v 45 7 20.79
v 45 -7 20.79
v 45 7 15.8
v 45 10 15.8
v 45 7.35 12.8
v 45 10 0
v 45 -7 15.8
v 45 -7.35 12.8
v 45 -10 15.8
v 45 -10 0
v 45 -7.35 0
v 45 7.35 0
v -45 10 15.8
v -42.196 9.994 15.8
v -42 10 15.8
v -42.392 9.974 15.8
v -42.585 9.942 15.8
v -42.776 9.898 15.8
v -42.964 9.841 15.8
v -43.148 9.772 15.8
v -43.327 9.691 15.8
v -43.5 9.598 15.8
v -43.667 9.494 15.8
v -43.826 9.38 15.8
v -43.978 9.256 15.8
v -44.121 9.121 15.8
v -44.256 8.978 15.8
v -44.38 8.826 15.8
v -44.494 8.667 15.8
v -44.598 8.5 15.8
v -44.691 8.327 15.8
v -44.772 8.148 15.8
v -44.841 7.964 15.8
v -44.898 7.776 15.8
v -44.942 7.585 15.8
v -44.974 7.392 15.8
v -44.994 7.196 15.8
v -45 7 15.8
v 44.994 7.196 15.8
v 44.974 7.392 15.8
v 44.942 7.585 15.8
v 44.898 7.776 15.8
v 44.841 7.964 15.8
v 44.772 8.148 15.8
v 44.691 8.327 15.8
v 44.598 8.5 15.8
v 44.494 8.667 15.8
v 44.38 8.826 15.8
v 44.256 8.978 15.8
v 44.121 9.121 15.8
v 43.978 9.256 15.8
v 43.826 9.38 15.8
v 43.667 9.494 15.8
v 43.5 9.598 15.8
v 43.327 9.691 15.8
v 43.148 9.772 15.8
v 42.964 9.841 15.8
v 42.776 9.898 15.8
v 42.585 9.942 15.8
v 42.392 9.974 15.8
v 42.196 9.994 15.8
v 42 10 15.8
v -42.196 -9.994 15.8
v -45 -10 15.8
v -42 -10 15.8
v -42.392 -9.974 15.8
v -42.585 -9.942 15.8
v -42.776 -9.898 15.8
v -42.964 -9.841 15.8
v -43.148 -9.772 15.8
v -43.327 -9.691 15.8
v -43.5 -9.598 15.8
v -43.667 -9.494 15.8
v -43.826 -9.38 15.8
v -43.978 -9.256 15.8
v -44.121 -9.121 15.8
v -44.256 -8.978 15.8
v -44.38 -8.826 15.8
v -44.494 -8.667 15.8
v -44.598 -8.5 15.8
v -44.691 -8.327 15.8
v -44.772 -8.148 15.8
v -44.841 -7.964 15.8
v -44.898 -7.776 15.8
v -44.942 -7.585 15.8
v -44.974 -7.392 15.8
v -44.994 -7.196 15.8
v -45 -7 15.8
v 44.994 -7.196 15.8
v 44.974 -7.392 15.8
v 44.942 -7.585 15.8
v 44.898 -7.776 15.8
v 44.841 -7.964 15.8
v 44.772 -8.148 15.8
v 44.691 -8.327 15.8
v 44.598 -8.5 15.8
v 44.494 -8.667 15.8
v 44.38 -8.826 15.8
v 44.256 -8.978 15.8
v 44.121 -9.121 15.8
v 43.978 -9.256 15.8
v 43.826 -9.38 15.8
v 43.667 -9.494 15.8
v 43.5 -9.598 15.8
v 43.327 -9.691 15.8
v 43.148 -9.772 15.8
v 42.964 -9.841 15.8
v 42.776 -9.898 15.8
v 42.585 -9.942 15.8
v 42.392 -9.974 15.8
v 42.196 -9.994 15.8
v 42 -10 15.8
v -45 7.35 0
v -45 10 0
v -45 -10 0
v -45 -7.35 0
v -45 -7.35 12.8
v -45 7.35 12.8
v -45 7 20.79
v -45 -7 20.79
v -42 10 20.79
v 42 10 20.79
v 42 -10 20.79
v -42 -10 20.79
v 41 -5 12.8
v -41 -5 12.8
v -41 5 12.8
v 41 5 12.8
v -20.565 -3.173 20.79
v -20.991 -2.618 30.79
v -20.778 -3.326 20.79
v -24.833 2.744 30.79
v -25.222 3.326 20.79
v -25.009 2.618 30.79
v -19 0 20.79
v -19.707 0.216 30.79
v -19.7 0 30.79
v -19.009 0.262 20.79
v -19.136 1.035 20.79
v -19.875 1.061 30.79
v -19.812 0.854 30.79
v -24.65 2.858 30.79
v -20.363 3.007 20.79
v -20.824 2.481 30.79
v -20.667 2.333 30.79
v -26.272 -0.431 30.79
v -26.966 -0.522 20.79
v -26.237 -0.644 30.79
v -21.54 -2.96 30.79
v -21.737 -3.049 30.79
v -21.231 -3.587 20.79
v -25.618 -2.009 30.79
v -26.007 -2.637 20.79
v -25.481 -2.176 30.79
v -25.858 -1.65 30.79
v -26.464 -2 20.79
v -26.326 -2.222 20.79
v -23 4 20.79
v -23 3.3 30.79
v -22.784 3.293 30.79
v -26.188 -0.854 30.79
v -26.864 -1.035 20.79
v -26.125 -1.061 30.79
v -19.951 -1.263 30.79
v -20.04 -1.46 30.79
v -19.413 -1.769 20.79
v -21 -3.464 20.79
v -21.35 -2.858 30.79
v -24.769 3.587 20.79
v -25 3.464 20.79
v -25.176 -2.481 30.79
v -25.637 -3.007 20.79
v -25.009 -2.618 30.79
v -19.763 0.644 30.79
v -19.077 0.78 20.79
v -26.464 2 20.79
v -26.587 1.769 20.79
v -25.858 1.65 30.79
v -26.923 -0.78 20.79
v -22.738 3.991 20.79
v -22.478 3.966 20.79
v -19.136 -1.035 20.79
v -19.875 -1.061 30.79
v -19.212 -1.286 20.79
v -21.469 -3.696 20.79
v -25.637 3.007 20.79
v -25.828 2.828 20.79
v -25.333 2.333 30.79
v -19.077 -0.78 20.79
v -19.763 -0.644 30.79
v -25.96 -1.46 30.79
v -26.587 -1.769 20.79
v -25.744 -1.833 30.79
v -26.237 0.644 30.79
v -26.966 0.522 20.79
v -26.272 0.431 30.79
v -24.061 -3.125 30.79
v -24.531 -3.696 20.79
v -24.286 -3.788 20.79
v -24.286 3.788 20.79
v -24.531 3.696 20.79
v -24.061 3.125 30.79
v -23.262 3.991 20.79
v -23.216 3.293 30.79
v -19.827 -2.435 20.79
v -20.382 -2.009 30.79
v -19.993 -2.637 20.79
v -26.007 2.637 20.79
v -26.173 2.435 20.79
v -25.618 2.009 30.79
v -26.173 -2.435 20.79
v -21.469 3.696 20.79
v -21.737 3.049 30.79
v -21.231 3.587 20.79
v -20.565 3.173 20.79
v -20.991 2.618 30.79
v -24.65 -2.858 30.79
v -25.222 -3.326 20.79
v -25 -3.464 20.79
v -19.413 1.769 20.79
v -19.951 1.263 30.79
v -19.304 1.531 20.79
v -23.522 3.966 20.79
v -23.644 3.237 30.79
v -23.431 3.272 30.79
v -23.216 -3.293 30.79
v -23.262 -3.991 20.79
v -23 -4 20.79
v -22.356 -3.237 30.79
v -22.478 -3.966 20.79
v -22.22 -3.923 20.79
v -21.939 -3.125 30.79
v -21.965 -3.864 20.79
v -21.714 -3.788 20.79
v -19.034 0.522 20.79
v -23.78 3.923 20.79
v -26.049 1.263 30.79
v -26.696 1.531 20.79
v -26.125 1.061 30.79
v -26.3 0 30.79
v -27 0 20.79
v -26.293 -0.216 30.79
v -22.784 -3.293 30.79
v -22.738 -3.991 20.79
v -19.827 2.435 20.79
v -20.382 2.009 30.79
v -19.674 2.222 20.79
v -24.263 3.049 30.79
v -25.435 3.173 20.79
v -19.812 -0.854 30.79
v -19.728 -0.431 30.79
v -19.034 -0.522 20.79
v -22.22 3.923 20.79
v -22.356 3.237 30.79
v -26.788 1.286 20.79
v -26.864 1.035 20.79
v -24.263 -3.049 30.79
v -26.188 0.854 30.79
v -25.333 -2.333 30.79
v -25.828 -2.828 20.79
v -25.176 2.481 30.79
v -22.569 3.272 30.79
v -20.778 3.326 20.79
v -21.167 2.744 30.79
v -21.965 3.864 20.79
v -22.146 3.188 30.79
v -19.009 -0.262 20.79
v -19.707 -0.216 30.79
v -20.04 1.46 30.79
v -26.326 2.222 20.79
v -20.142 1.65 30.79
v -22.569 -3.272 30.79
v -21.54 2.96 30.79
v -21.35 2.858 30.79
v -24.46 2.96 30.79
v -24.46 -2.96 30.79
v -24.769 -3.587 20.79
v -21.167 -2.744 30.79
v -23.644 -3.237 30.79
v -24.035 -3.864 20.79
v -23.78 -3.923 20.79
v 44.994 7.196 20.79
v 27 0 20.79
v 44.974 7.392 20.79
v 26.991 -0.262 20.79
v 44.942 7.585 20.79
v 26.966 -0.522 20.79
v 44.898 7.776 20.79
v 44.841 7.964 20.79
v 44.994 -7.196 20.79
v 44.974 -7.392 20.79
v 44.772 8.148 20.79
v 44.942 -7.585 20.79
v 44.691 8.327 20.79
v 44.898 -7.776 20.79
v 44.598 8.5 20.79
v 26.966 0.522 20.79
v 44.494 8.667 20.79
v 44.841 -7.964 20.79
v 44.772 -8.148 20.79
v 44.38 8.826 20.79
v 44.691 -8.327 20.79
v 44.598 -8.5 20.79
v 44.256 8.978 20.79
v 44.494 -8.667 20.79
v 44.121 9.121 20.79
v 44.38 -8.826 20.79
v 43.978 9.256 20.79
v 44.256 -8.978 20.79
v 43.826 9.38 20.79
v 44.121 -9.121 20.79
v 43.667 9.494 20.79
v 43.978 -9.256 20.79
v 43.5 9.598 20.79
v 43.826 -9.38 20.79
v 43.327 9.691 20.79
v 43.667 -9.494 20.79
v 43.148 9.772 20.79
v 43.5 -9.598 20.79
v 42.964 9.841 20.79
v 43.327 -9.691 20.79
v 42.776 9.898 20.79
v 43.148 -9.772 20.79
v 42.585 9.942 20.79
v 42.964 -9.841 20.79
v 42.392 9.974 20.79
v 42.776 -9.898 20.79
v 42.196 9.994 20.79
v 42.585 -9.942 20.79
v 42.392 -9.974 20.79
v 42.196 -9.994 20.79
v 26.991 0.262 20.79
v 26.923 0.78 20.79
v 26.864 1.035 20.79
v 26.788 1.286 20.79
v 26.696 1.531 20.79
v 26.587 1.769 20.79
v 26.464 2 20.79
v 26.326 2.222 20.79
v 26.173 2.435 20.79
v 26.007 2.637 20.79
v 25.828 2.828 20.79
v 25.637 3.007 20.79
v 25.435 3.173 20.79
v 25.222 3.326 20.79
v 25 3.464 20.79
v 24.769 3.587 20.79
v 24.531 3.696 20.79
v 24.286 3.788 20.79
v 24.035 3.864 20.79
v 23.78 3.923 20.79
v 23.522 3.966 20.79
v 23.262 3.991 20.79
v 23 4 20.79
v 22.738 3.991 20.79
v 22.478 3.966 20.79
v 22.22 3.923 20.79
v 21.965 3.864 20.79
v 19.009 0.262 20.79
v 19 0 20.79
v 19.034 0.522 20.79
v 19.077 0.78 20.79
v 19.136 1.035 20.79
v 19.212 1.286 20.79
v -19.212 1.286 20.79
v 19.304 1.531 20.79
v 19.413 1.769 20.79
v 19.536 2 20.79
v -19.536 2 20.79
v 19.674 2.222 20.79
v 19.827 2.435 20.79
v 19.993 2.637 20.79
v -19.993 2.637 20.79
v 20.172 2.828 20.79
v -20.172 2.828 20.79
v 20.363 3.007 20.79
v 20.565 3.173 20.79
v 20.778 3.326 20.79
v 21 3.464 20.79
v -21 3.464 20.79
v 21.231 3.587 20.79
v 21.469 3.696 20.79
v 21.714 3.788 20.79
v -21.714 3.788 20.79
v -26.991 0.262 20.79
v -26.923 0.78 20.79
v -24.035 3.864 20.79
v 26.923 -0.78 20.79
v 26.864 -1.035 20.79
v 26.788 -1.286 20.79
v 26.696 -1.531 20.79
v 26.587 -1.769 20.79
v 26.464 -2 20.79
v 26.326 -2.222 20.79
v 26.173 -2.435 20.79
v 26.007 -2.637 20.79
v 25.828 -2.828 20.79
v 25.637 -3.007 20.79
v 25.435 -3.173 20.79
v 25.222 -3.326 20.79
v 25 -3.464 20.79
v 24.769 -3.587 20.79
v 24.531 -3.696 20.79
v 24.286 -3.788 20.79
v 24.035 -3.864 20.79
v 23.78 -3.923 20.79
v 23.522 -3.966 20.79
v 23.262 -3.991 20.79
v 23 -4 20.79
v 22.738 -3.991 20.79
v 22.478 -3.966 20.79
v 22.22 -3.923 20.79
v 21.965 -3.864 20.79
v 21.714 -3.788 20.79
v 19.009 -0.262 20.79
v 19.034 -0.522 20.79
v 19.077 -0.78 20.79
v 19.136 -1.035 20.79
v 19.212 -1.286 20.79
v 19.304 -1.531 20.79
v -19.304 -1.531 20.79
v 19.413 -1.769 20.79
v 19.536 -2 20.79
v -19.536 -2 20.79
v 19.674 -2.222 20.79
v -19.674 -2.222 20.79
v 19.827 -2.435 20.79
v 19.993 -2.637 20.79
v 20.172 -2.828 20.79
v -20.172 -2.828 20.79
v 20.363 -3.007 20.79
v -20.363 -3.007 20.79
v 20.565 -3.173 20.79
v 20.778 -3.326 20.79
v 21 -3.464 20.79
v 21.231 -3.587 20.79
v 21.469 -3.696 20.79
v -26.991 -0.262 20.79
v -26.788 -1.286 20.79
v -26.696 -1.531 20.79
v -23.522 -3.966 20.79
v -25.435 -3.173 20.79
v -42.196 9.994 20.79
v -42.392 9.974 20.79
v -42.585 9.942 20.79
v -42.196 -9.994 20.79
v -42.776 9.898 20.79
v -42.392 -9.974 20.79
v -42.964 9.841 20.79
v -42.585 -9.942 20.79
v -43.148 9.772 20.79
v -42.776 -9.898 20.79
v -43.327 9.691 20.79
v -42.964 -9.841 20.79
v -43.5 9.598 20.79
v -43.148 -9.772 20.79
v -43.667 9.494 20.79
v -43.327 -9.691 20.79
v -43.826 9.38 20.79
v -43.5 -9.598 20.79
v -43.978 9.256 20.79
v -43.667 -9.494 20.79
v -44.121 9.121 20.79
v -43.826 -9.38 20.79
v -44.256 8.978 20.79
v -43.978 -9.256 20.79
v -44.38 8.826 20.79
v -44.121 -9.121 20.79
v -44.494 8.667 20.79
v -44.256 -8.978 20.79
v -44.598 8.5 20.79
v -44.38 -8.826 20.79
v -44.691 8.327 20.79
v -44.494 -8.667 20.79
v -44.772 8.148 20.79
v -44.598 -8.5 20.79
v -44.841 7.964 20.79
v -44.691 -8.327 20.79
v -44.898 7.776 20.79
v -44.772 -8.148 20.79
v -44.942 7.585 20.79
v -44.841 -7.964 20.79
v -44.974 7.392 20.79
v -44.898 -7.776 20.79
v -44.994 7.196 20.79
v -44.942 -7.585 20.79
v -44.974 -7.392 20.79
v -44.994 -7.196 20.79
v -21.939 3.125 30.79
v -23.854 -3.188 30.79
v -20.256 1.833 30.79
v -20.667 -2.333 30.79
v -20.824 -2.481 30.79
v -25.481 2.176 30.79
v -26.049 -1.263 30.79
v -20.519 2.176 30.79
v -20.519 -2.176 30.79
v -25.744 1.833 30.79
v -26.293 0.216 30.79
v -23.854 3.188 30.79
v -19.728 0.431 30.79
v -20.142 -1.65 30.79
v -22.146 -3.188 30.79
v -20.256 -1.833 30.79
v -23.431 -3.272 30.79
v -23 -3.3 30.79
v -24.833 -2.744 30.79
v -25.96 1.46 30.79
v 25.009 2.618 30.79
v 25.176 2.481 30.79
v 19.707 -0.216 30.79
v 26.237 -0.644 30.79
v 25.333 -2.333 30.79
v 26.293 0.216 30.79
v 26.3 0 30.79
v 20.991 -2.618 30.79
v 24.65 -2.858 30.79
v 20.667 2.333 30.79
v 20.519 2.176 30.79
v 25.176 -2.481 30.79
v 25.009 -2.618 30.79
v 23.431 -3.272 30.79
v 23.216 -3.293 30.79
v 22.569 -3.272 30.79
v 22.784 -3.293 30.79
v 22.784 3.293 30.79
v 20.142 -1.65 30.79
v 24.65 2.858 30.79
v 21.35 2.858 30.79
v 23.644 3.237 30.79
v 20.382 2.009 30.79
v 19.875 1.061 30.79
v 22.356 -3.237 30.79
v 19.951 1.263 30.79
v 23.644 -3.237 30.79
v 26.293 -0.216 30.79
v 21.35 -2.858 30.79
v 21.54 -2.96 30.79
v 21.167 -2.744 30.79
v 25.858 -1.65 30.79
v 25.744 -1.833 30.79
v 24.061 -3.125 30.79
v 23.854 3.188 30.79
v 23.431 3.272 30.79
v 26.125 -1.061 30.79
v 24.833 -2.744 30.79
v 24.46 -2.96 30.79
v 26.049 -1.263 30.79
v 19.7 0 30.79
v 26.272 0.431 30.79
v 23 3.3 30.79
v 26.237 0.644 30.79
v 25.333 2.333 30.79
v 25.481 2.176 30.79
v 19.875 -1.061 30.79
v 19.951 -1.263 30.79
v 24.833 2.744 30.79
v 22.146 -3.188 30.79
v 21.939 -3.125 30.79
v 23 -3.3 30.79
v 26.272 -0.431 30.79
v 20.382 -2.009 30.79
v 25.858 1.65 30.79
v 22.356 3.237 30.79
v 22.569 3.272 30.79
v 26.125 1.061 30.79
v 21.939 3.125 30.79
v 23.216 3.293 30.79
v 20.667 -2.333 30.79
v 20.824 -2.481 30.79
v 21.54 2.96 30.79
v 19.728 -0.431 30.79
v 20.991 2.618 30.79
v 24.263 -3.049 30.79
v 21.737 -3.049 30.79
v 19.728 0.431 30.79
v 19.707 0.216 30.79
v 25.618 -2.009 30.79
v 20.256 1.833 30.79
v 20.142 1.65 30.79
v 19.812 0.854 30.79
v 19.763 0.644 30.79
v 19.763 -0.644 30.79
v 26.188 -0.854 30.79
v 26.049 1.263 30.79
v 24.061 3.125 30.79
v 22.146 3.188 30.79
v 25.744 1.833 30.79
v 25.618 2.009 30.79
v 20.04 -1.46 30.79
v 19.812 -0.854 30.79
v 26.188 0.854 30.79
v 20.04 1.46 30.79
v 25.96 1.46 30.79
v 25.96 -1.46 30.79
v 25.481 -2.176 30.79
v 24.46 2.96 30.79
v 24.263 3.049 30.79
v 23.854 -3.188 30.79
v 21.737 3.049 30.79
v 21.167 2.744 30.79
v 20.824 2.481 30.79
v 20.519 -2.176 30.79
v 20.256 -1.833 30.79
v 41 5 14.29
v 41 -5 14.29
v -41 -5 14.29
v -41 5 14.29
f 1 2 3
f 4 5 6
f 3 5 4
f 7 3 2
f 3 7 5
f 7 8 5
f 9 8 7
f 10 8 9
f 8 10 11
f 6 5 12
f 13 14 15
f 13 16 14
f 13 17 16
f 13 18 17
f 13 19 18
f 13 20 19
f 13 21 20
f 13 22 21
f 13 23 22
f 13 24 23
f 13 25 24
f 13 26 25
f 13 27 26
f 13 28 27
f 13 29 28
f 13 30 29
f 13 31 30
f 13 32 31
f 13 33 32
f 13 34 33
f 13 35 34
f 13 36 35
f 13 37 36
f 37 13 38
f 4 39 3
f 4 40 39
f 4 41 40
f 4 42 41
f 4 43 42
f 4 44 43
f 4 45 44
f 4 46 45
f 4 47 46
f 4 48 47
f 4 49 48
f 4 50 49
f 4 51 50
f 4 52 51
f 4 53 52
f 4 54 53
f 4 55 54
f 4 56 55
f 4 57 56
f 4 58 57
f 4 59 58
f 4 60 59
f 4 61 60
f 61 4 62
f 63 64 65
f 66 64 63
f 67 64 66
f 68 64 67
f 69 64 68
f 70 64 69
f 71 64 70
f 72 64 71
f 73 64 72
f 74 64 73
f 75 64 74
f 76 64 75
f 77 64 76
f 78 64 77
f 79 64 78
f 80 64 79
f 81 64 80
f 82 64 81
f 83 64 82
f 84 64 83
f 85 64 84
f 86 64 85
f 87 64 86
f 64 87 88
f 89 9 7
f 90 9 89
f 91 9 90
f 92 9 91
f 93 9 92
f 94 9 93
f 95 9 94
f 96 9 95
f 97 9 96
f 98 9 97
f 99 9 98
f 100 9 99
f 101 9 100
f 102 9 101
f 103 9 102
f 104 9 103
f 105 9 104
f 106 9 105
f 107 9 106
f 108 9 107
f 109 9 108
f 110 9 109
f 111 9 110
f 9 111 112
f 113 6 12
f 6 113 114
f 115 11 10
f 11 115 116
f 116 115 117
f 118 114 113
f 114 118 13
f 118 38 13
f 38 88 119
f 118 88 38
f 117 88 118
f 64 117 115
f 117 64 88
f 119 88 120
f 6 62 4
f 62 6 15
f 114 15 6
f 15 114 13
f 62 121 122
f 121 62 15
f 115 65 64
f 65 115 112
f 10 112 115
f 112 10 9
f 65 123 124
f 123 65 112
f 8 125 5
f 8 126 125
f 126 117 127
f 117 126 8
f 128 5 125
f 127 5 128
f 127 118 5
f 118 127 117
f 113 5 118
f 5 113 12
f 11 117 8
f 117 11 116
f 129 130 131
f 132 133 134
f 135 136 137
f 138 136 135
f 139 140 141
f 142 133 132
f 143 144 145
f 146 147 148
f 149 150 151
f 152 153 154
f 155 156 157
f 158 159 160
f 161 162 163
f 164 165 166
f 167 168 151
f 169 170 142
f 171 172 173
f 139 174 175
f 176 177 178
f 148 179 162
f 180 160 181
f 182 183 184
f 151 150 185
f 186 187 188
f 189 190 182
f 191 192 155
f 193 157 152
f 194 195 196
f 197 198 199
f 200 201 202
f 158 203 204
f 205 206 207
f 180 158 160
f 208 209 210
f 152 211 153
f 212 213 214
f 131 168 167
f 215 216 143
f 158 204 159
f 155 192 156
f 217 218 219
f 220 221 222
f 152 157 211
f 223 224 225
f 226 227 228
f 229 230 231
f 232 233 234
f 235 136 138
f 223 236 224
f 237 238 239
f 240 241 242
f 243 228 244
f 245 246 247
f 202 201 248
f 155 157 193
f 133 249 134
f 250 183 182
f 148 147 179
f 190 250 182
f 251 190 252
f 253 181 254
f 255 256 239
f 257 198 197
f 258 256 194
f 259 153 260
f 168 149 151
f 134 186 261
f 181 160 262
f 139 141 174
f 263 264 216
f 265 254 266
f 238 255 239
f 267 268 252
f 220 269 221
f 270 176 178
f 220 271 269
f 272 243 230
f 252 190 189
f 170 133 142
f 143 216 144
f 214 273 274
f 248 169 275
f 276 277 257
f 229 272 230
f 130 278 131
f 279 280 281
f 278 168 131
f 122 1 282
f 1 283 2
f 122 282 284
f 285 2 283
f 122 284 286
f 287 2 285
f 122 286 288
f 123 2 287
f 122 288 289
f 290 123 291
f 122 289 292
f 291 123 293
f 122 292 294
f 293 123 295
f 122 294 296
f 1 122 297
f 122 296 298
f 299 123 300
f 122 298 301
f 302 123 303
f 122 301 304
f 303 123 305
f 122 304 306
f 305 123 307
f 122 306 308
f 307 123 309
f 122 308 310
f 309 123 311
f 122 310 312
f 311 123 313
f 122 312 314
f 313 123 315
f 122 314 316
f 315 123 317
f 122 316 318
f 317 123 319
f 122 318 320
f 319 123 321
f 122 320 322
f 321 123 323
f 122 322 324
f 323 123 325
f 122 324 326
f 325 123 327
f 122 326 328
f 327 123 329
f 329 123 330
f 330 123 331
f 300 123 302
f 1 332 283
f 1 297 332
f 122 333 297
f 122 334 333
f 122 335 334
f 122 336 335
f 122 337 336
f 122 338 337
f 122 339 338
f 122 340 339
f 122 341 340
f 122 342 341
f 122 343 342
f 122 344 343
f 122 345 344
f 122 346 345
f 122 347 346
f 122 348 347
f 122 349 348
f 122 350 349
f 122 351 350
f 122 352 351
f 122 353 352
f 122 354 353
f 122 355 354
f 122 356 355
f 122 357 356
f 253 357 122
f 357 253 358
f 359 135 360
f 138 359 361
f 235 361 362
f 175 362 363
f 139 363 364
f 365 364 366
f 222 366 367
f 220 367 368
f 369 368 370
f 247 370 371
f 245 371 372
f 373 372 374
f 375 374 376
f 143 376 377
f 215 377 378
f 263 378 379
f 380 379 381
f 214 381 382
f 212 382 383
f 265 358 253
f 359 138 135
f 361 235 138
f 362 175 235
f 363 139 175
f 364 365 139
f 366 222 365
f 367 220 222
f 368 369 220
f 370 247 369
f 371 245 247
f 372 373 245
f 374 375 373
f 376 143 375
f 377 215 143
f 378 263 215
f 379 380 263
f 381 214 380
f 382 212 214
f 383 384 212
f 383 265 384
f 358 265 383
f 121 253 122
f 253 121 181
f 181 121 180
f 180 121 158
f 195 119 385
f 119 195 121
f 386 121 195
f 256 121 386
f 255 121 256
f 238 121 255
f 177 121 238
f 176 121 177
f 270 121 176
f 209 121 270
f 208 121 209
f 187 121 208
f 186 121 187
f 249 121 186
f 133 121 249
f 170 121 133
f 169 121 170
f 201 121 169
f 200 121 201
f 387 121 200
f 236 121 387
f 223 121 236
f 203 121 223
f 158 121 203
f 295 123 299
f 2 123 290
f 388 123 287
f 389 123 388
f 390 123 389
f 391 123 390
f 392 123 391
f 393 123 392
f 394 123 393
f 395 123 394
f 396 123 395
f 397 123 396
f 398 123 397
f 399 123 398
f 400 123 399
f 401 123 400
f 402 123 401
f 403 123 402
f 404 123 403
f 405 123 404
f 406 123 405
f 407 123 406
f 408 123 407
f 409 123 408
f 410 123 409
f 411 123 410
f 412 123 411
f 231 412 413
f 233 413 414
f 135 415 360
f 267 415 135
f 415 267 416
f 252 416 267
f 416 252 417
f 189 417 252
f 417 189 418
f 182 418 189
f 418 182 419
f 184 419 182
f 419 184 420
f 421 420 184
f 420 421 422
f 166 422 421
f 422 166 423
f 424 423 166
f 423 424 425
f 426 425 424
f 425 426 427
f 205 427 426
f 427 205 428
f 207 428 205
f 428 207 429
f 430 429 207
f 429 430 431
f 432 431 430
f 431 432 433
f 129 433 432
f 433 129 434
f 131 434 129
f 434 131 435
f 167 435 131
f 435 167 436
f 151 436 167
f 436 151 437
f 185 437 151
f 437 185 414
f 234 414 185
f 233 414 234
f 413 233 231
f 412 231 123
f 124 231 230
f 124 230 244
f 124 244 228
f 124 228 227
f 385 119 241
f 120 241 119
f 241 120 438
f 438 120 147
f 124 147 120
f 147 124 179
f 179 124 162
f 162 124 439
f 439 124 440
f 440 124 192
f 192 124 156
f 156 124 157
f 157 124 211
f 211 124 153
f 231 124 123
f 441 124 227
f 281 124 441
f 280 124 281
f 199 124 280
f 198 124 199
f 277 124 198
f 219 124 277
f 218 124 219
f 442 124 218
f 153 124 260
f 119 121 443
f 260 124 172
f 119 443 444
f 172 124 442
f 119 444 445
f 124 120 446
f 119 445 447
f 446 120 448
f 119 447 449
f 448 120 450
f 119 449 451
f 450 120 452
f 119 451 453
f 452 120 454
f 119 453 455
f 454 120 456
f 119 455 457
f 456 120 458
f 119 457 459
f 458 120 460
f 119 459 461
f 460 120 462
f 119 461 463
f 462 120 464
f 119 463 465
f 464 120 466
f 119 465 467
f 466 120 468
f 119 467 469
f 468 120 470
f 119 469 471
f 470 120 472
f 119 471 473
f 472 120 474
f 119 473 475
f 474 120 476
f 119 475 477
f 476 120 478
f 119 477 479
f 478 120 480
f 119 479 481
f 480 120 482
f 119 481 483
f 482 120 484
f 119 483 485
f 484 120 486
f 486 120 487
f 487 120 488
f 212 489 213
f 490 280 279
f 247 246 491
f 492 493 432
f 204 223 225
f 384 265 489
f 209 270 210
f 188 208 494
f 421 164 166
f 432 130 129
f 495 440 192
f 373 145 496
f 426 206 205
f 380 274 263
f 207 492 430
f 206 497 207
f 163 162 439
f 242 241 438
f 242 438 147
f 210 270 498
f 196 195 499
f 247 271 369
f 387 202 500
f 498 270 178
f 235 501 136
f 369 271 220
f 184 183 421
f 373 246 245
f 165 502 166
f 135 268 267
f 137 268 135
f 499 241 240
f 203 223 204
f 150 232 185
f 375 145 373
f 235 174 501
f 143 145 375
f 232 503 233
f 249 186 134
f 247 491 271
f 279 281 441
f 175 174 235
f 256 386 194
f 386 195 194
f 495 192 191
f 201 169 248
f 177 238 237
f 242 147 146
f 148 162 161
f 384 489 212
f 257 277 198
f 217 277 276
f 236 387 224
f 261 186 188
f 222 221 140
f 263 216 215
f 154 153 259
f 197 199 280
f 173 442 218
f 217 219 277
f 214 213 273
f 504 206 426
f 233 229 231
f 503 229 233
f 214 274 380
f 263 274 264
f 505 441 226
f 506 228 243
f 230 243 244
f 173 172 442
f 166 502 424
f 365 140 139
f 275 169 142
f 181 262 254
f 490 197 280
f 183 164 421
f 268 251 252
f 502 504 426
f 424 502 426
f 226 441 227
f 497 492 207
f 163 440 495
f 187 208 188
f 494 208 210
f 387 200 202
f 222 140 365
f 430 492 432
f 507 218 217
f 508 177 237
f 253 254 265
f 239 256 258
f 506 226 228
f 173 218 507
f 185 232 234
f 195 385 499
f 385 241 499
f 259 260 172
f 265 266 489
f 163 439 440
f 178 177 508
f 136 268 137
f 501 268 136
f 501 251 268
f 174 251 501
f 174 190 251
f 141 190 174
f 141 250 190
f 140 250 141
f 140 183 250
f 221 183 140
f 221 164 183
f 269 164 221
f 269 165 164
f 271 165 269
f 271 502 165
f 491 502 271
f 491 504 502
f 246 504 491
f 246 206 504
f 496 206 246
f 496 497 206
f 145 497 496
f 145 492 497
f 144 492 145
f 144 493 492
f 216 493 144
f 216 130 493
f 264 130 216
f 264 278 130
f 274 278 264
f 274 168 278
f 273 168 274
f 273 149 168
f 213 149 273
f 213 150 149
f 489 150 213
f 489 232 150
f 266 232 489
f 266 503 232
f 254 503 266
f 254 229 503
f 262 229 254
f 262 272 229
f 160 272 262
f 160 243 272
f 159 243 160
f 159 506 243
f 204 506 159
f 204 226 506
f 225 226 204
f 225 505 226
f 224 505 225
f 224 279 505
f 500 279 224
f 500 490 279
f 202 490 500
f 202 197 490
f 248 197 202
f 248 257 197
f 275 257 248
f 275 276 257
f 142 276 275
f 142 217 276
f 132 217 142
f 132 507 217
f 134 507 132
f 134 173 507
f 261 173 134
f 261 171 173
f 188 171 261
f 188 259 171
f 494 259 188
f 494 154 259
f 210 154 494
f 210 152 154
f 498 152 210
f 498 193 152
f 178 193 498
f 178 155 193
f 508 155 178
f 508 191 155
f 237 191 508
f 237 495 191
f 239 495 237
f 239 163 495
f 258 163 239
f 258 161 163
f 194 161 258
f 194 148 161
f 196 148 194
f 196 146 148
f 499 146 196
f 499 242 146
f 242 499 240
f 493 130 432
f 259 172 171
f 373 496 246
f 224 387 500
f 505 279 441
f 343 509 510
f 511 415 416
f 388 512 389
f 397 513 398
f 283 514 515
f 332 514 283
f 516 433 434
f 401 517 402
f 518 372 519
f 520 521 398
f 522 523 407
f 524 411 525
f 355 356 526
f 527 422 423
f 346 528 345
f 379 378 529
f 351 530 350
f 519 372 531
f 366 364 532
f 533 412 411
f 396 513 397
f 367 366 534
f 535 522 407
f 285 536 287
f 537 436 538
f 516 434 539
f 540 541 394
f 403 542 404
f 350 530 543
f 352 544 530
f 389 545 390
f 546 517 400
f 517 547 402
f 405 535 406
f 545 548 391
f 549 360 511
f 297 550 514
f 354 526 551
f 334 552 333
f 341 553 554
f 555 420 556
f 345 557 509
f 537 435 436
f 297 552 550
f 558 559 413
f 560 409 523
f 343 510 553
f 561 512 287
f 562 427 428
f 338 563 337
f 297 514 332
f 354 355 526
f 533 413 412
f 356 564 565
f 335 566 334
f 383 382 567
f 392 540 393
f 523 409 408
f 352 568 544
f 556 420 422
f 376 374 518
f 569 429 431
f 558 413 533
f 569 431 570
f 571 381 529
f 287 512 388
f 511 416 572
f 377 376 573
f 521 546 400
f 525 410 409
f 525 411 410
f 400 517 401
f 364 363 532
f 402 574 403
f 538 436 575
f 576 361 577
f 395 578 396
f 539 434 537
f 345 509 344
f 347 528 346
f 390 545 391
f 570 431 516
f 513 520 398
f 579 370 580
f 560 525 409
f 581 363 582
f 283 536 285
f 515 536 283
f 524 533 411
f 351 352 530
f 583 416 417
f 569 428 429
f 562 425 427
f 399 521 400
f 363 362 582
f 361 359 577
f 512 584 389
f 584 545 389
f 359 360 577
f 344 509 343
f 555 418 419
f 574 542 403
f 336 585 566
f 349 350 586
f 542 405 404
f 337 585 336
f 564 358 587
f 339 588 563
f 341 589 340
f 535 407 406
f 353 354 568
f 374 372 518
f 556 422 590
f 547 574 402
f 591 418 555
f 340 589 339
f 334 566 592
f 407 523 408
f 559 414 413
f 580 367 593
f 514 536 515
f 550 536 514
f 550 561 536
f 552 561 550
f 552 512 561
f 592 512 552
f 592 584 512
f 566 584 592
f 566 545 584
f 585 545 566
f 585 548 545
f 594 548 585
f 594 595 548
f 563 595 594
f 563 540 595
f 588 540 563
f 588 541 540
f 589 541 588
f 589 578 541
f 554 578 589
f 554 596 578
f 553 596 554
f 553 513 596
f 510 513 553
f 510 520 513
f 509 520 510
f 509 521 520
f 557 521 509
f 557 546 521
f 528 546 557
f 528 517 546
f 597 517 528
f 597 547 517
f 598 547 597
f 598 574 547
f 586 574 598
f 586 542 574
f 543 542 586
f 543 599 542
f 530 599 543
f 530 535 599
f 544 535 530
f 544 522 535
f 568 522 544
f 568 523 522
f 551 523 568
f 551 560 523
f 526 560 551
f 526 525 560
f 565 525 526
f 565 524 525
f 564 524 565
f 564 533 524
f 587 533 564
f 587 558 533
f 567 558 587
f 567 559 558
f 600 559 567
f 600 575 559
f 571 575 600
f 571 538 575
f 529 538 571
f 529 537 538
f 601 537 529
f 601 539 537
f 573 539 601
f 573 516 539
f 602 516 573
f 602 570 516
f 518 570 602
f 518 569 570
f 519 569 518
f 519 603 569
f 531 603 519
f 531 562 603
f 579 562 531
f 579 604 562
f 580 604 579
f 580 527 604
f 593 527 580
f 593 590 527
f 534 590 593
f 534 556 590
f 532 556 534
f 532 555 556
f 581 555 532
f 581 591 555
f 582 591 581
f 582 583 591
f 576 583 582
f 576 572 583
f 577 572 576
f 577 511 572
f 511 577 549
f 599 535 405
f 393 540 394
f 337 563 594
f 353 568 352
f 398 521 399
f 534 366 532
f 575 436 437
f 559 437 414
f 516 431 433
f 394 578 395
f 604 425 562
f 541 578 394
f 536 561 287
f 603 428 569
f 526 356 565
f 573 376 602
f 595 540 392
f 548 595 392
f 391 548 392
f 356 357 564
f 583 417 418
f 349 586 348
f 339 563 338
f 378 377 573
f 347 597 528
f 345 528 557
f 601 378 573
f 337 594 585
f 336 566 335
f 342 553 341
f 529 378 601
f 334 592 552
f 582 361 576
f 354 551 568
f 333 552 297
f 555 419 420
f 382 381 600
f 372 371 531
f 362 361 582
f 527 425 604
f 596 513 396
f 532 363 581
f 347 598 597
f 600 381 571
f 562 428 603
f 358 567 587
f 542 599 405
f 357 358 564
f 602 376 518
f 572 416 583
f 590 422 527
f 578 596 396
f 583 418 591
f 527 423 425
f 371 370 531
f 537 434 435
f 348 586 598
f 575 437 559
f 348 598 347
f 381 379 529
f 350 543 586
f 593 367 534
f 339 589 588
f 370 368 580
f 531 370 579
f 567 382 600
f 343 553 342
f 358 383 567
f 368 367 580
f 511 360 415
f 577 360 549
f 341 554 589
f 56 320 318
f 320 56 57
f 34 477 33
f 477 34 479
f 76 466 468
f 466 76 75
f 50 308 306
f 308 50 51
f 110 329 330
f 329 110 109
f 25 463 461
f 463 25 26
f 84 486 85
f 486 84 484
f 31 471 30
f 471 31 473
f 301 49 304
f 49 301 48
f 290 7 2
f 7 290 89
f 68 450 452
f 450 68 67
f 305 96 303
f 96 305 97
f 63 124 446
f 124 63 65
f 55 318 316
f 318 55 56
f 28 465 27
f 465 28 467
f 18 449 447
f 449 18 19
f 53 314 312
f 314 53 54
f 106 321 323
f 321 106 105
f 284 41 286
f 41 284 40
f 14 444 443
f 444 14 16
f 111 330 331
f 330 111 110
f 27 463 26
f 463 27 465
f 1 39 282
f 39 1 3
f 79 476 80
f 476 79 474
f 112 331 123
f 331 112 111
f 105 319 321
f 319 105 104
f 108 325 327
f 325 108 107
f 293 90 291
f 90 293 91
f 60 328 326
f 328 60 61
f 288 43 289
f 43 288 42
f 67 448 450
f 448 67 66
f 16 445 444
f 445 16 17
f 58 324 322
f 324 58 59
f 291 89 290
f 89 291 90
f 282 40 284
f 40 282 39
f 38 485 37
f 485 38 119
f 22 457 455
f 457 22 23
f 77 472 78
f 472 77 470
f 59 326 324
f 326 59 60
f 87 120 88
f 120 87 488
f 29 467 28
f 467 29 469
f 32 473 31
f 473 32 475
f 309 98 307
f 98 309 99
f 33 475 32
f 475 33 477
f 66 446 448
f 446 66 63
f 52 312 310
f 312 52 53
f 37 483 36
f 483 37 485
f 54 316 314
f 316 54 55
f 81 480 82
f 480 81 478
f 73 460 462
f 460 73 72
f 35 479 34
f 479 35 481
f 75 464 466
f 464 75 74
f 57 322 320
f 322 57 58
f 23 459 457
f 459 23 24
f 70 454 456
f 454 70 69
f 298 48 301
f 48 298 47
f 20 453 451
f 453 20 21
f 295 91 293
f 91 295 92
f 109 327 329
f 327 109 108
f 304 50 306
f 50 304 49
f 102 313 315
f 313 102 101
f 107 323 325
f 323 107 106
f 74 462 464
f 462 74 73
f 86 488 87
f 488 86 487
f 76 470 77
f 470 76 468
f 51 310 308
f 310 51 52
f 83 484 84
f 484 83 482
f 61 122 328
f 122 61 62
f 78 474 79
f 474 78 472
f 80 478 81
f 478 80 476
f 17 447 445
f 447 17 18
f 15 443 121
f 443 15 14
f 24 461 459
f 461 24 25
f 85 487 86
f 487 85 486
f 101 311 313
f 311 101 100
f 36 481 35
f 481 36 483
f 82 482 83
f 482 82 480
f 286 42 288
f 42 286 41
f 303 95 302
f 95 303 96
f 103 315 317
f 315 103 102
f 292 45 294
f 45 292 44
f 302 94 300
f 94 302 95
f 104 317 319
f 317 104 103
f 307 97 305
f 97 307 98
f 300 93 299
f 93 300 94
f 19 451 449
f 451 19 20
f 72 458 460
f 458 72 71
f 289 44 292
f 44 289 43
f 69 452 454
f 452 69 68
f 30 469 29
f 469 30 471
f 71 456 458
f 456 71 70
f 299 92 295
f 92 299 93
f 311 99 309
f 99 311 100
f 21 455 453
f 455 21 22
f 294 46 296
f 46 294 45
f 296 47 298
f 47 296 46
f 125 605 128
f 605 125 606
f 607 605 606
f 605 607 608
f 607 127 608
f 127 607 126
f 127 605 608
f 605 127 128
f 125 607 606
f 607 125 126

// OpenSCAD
// file: common.scad
// common.scad — shared parameters for the aquarium grow-box parts.
// Everything downstream is driven from here. Measure YOUR tank, fan and lid
// with calipers and edit this file; do not trust the defaults.

$fn = 96;

/* ---------------- measured inputs ---------------- */
glass_t  = 6;      // tank wall glass thickness. 20-long / 29 gal is usually 5-6 mm.
rim_w    = 14;     // width of the plastic top trim, front to back
rim_h    = 16;     // height of the plastic top trim
lid_t    = 3;      // chamber lid sheet thickness. 3 mm polycarbonate default.
panel_t  = 3;      // chamber wall sheet thickness
deck_t   = 18;     // deck sheet thickness: the tank's cap and the chamber's floor
duct_nom = 101.6;  // 4 in duct. Use 152.4 for a 6 in fan.
probe_d  = 10;     // sensor-probe body diameter
cable_d  = 6;      // fattest cable that must pass through the lid

/* ---------------- print fit ---------------- */
slop = 0.35;  // clearance per side on sliding fits
wall = 3;     // default wall thickness
eps  = 0.01;  // z-fighting guard

/* ---------------- helpers ---------------- */

// A ring of clearance holes, drilled from z=0 upward.
module bolt_ring(count, radius, hole_d, depth) {
    for (i = [0 : count - 1])
        rotate([0, 0, i * 360 / count])
            translate([radius, 0, -eps])
                cylinder(d = hole_d, h = depth + 2 * eps);
}

// Rounded rectangular plate centred on the origin, sitting on z=0.
module rounded_plate(x, y, z, r = 4) {
    hull()
        for (dx = [-1, 1], dy = [-1, 1])
            translate([dx * (x / 2 - r), dy * (y / 2 - r), 0])
                cylinder(r = r, h = z);
}

// Four corner clearance holes inset from the edges of an x by y plate.
module corner_holes(x, y, inset, hole_d, depth) {
    for (dx = [-1, 1], dy = [-1, 1])
        translate([dx * (x / 2 - inset), dy * (y / 2 - inset), -eps])
            cylinder(d = hole_d, h = depth + 2 * eps);
}

// Upside-down U that straddles the tank's top trim. Opening faces -z, length
// runs along x. -y is the tank interior, +y is the outside.
// `outer_foot` extends the outer wall down the outside glass: that is what
// stops a hanging load from levering the part off the rim. Put a strip of EVA
// foam between the foot and the glass.
// Print with the opening facing up, no supports.
module rim_saddle(len = 40, jaw = rim_w, depth = rim_h * 0.8, t = wall,
                  outer_foot = 0) {
    union() {
        difference() {
            translate([-len / 2, -(jaw / 2 + t), 0])
                cube([len, jaw + 2 * t, depth + t]);
            translate([-len / 2 - eps, -(jaw / 2 + slop), -eps])
                cube([len + 2 * eps, jaw + 2 * slop, depth + eps]);
        }
        if (outer_foot > 0)
            translate([-len / 2, jaw / 2 + slop, -outer_foot])
                cube([len, t - slop, outer_foot + eps]);
    }
}

// Height of the top face of a default rim_saddle.
saddle_top = rim_h * 0.8 + wall;

// Right-triangle brace: base `len` along +x, `height` along +z, `thick` in -y.
module gusset(len, height, thick) {
    rotate([90, 0, 0])
        linear_extrude(height = thick)
            polygon([[0, 0], [len, 0], [0, height]]);
}
// main file
// deck_pad.scad — the load path. The chamber sits on a deck; the deck sits on
// these; these sit on the tank's top trim. Their whole job is to turn a few
// point loads into a long, even line load along the rim, and to stop the deck
// sliding without fastening anything to the tank.
// Six to eight per tank, evenly spaced along the two long sides.
// Print as modelled, pegs up: the rim slot bridges and needs no supports.

include <common.scad>

pad_len  = 90;                    // long on purpose — this is the spreader
pad_t    = 5;                     // bearing plate over the rim
pad_w    = rim_w + 2 * wall;      // flush with the saddle, no overhang to print
peg_d    = 8;                     // locating peg into the deck's underside
peg_h    = 10;
peg_gap  = 46;                    // peg spacing
foam_t   = 1.5;                   // relief for the EVA strip on the rim

module deck_pad() {
    difference() {
        union() {
            rim_saddle(len = pad_len);
            translate([0, 0, saddle_top - eps])
                rounded_plate(pad_len, pad_w, pad_t, 3);
            for (dx = [-1, 1])
                translate([dx * peg_gap / 2, 0, saddle_top + pad_t - eps])
                    cylinder(d1 = peg_d, d2 = peg_d - 1.4, h = peg_h);
        }
        // shallow relief so the EVA foam strip has somewhere to live and the
        // print's first layer never bears directly on glass
        translate([0, 0, rim_h * 0.8 - eps])
            translate([-pad_len / 2 + 4, -(rim_w / 2 - 2), 0])
                cube([pad_len - 8, rim_w - 4, foam_t]);
    }
}

deck_pad();
